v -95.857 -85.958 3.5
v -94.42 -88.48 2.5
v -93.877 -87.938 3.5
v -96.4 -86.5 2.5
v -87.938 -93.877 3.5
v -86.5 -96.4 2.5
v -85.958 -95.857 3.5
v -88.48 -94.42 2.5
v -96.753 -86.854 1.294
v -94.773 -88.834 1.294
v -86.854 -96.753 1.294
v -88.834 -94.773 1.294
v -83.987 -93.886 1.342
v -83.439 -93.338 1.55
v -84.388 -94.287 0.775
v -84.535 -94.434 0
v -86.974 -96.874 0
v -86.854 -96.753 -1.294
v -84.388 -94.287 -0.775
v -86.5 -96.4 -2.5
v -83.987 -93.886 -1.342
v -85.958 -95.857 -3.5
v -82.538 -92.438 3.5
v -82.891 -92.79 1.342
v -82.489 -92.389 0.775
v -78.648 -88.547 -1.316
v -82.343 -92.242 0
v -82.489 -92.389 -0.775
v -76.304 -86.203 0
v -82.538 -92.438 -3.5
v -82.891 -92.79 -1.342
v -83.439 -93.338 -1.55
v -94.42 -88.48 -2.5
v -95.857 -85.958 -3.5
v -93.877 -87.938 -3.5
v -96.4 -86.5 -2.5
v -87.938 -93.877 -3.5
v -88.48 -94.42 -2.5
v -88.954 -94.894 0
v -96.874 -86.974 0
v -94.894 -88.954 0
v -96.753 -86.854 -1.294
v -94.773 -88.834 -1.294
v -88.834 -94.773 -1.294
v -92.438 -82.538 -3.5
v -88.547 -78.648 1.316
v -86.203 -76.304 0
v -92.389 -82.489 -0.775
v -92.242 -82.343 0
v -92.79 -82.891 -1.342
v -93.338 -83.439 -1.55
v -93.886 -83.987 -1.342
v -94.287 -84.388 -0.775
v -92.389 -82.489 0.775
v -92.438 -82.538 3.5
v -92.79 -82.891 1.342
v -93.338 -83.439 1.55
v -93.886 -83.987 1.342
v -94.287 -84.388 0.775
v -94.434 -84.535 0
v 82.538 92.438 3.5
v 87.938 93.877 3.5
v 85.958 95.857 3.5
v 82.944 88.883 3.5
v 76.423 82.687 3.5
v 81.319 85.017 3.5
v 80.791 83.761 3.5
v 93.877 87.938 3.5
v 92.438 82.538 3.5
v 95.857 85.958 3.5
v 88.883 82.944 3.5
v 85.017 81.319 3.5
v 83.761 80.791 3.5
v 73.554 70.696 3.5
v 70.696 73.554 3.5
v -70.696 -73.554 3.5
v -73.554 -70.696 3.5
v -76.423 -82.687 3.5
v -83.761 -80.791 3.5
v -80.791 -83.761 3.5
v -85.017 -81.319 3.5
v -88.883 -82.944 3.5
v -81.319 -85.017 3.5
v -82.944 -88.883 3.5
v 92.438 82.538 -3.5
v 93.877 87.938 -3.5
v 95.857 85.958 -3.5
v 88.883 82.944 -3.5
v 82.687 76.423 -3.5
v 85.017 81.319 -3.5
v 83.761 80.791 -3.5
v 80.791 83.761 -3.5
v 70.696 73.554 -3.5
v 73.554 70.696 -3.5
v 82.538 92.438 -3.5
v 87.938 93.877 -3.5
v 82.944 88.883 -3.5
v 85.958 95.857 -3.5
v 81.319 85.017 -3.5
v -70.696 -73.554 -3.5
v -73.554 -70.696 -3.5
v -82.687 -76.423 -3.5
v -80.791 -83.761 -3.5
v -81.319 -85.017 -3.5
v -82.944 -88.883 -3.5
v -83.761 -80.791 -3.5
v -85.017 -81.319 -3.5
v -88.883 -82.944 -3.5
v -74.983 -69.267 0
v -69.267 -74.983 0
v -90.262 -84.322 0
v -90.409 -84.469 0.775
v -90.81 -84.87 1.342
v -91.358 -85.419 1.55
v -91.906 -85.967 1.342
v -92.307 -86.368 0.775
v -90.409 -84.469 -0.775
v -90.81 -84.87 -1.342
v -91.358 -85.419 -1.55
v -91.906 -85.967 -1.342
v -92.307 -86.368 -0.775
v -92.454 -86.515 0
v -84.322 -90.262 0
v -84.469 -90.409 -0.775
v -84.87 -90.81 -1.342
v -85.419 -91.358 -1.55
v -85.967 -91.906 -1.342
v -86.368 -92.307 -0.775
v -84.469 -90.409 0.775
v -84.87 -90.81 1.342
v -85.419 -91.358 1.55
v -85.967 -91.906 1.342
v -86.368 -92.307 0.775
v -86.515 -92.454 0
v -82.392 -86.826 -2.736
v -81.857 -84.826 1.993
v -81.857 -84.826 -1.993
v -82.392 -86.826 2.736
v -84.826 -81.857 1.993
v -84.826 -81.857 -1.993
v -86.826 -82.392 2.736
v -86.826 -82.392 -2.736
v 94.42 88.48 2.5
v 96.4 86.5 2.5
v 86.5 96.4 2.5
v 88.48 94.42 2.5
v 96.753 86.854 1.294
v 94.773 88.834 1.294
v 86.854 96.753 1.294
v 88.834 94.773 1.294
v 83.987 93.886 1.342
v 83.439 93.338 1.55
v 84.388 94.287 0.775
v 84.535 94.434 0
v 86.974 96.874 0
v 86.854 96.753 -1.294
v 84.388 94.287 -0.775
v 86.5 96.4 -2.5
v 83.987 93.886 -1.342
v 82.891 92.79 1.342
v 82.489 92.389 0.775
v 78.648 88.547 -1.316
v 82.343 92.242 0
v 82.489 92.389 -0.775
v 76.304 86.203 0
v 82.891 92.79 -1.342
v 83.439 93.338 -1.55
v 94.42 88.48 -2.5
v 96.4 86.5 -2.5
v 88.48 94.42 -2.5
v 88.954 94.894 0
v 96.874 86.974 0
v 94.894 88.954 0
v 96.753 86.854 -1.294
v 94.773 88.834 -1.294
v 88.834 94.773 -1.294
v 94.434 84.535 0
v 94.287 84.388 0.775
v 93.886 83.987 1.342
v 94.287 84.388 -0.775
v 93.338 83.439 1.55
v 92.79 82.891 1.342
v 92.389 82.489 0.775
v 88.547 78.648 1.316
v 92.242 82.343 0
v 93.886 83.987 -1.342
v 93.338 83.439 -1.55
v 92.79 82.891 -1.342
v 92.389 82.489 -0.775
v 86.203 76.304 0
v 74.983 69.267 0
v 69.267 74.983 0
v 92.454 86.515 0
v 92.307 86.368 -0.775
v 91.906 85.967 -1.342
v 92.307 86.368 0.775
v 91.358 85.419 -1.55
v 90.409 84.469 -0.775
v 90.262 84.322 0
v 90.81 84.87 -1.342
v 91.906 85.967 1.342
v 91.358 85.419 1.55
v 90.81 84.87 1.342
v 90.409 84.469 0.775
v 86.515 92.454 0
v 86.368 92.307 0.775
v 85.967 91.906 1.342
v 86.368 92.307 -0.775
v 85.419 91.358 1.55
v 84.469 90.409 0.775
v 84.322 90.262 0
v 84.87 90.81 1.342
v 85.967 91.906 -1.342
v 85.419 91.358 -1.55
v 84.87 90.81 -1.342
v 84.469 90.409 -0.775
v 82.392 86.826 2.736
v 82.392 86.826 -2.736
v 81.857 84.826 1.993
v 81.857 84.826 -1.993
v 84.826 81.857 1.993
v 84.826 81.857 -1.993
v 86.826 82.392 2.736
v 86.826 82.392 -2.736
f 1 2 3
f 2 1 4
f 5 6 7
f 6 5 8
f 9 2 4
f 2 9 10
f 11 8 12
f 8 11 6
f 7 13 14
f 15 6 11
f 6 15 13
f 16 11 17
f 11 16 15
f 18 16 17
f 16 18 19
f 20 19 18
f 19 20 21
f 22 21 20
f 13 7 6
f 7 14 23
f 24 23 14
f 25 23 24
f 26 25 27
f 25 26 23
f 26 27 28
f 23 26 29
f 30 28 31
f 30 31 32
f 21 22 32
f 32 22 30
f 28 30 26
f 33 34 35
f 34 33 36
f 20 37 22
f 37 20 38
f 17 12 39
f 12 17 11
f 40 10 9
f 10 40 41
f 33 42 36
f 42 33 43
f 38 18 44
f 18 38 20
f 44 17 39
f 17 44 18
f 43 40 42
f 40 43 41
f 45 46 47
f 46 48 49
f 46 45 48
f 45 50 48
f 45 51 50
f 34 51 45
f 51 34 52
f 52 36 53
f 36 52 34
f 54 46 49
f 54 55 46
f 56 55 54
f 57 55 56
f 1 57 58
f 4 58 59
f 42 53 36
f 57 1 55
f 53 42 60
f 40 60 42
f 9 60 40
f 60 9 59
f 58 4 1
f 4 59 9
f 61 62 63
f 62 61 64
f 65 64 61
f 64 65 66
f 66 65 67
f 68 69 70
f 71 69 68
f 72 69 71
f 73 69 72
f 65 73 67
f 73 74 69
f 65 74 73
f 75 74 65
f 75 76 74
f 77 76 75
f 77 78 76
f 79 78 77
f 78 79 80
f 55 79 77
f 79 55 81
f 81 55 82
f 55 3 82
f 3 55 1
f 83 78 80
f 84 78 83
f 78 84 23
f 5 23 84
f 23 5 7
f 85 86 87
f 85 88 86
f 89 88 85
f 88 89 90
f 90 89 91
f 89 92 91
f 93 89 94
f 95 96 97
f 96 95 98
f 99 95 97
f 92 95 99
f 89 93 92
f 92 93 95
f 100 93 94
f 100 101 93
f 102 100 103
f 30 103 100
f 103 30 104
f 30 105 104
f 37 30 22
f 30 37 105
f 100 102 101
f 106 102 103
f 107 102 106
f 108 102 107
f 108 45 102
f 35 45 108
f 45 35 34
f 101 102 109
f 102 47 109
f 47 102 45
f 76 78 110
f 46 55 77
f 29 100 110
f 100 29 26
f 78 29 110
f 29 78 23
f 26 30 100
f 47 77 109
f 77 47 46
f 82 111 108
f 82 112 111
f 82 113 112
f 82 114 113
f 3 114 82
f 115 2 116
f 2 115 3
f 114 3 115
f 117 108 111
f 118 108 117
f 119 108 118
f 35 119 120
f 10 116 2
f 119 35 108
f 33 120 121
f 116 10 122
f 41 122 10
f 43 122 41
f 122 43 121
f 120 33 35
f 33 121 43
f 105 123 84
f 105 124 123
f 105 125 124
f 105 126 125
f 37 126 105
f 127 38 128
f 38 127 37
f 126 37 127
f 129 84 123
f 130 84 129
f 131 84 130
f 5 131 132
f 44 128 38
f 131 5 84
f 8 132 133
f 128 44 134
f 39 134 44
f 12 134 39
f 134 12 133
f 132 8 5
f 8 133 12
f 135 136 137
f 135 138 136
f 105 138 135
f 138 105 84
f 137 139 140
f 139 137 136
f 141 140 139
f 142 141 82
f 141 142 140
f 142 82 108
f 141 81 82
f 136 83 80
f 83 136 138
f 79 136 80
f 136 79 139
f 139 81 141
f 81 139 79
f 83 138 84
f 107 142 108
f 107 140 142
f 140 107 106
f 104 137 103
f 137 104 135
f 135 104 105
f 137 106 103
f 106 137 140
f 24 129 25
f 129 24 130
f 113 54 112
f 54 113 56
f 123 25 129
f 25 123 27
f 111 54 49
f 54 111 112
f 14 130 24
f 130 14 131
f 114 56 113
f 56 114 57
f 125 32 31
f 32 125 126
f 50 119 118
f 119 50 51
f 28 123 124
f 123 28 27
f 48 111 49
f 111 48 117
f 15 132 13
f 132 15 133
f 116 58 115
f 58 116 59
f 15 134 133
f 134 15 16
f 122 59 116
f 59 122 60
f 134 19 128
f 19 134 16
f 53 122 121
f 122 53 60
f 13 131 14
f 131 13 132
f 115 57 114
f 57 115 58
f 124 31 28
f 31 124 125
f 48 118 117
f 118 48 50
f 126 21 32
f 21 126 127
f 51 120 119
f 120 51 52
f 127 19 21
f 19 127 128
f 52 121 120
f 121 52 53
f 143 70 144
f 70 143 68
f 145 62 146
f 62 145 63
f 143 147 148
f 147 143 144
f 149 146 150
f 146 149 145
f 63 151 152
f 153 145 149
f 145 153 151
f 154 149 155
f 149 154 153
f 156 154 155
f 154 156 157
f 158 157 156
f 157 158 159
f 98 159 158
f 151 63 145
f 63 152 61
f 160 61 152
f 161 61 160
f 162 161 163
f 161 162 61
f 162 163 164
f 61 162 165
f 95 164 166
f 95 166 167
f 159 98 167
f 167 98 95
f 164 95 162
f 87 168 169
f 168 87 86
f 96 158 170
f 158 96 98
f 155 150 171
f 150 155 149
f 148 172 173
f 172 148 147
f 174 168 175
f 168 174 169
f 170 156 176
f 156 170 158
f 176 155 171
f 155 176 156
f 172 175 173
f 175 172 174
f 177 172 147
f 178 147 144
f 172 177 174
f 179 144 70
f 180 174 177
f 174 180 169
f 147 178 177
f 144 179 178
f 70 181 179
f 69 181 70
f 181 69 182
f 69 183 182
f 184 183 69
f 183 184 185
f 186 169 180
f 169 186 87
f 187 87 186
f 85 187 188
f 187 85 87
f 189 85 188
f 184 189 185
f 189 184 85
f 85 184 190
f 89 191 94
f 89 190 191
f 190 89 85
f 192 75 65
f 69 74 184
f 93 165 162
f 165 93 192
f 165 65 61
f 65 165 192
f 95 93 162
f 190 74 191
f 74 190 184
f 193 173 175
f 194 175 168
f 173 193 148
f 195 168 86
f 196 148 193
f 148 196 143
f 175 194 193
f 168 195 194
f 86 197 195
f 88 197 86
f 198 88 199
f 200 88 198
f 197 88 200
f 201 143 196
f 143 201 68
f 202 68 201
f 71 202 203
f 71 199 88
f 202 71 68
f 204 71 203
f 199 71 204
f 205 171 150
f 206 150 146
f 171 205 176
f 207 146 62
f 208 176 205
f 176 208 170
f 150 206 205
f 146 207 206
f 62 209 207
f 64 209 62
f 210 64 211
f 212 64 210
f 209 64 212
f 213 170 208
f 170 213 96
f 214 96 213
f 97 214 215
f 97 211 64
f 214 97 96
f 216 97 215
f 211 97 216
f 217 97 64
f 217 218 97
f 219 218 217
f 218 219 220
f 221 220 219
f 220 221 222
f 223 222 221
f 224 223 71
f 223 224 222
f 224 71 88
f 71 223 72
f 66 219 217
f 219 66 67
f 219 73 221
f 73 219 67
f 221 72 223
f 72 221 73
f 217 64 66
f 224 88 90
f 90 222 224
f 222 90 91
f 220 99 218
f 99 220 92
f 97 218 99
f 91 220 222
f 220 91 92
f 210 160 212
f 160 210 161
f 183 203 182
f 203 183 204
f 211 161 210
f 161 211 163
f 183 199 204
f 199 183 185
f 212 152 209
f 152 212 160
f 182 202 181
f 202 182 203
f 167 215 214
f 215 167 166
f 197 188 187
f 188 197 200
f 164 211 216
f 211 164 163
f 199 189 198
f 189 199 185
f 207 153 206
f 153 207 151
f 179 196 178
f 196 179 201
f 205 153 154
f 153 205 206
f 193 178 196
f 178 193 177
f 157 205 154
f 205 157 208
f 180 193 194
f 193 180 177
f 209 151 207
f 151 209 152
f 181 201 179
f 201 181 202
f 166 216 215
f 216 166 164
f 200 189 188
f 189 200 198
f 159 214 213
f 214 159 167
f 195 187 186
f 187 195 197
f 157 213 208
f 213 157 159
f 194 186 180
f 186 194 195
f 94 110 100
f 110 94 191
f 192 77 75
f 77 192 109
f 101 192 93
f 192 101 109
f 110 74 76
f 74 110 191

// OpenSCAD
/*  [Rod] */
//Bolt-to-bolt distance 
rod_len = 250;
//Height of the rod
rod_h = 7;

/* [Jaw] */
//Height of the jaw
h = 7;

//ignore variable values
r = h/2 / cos(30);
rod_r = rod_h/2 / cos(30);
module stumpy() {
	rotate([0, 90]) rotate([0, 0, 30]) intersection() {
		cylinder(r=r, h=8, center=true, $fn=6);
		sphere(r=5.1, $fn=24);
	}
}

module middle() {
	difference() {
		union() {
			translate([-2, 0, 0]) stumpy();
			translate([2, 0, 0]) stumpy();
			rotate([0, 0, 90]) stumpy();
		}
		rotate([90]) cylinder(r=1.5, h=30, center=true, $fn=12);
		rotate([0, 90]) cylinder(r=1.5, h=30, center=true, $fn=12);
	}
}

module sides() {
	difference() {
		union() {
			translate([-7, 0, 0]) rotate([0, 90])
				cylinder(r=2, h=4, center=true, $fn=12);
			translate([7, 0, 0]) rotate([0, 90])
				cylinder(r=2, h=4, center=true, $fn=12);
			translate([-7, 5, 0]) cube([4, 10, 4], center=true);
			translate([7, 5, 0]) cube([4, 10, 4], center=true);
		}
		rotate([0, 90]) cylinder(r=0.8, h=20, center=true, $fn=12);
	}
}

module jaws() {
	difference() {
		union() {
			intersection () {
				rotate([90]) cylinder(r=5, h=14, center=true, $fn=24);
				translate([-4, 0, 0]) cube([10, 14, h], center=true);
			}
			intersection() {
				translate([10, 0, 0]) cube([26, 14, h], center=true);
				translate([10, 0, 0]) rotate([0, 90]) rotate([0, 0, 30])
					cylinder(r1=10, r2=r, h=26, center=true, $fn=6);
			}
		}
		translate([-1.5, 0, 0]) cube([10, 8.4, 10], center=true);
		translate([3.5, 0, 0]) rotate([0, 0, 30])
			cylinder(r=4.2, h=10, center=true, $fn=6);
		translate([4, 0, 4]) rotate([0, 45])
			rotate([0, 0, 30]) cylinder(r=4.2, h=8, center=true, $fn=6);
		translate([4, 0, -4]) rotate([0, -45])
			rotate([0, 0, 30]) cylinder(r=4.2, h=8, center=true, $fn=6);
		rotate([90]) cylinder(r=1.55, h=40, center=true, $fn=12);
		translate([19, 0, 0]) rotate([0, 90])
			cylinder(r=2.8, h=20, center=true, $fn=12);
	}
}
// Wipe nozzle after long travel moves.
module collar() {
	difference() {
		cube([4, 20, rod_h], center=true);
		cube([2, 18, rod_h+1], center=true);
		rotate([0, 90]) rotate([0, 0, 30])
			cylinder(r=5, h=5, center=true, $fn=6);
	}
}

// Small hollow cube.
module cubicle() {
	difference() {
		cube([6, 6, rod_h], center=true);
		cube([4, 4, rod_h+1], center=true);
	}
}

rotate([0, 0, 45]) {
	// Rod with two Y shaped rod ends.
	union() {
		translate([-rod_len/2, 0, 0]) jaws();
		translate([rod_len/2, 0, 0]) rotate([0, 0, 180]) jaws();
		rotate([0, 90]) rotate([0, 0, 30])
			cylinder(r=rod_r, h=rod_len-18, center=true, $fn=6);
	}
}
